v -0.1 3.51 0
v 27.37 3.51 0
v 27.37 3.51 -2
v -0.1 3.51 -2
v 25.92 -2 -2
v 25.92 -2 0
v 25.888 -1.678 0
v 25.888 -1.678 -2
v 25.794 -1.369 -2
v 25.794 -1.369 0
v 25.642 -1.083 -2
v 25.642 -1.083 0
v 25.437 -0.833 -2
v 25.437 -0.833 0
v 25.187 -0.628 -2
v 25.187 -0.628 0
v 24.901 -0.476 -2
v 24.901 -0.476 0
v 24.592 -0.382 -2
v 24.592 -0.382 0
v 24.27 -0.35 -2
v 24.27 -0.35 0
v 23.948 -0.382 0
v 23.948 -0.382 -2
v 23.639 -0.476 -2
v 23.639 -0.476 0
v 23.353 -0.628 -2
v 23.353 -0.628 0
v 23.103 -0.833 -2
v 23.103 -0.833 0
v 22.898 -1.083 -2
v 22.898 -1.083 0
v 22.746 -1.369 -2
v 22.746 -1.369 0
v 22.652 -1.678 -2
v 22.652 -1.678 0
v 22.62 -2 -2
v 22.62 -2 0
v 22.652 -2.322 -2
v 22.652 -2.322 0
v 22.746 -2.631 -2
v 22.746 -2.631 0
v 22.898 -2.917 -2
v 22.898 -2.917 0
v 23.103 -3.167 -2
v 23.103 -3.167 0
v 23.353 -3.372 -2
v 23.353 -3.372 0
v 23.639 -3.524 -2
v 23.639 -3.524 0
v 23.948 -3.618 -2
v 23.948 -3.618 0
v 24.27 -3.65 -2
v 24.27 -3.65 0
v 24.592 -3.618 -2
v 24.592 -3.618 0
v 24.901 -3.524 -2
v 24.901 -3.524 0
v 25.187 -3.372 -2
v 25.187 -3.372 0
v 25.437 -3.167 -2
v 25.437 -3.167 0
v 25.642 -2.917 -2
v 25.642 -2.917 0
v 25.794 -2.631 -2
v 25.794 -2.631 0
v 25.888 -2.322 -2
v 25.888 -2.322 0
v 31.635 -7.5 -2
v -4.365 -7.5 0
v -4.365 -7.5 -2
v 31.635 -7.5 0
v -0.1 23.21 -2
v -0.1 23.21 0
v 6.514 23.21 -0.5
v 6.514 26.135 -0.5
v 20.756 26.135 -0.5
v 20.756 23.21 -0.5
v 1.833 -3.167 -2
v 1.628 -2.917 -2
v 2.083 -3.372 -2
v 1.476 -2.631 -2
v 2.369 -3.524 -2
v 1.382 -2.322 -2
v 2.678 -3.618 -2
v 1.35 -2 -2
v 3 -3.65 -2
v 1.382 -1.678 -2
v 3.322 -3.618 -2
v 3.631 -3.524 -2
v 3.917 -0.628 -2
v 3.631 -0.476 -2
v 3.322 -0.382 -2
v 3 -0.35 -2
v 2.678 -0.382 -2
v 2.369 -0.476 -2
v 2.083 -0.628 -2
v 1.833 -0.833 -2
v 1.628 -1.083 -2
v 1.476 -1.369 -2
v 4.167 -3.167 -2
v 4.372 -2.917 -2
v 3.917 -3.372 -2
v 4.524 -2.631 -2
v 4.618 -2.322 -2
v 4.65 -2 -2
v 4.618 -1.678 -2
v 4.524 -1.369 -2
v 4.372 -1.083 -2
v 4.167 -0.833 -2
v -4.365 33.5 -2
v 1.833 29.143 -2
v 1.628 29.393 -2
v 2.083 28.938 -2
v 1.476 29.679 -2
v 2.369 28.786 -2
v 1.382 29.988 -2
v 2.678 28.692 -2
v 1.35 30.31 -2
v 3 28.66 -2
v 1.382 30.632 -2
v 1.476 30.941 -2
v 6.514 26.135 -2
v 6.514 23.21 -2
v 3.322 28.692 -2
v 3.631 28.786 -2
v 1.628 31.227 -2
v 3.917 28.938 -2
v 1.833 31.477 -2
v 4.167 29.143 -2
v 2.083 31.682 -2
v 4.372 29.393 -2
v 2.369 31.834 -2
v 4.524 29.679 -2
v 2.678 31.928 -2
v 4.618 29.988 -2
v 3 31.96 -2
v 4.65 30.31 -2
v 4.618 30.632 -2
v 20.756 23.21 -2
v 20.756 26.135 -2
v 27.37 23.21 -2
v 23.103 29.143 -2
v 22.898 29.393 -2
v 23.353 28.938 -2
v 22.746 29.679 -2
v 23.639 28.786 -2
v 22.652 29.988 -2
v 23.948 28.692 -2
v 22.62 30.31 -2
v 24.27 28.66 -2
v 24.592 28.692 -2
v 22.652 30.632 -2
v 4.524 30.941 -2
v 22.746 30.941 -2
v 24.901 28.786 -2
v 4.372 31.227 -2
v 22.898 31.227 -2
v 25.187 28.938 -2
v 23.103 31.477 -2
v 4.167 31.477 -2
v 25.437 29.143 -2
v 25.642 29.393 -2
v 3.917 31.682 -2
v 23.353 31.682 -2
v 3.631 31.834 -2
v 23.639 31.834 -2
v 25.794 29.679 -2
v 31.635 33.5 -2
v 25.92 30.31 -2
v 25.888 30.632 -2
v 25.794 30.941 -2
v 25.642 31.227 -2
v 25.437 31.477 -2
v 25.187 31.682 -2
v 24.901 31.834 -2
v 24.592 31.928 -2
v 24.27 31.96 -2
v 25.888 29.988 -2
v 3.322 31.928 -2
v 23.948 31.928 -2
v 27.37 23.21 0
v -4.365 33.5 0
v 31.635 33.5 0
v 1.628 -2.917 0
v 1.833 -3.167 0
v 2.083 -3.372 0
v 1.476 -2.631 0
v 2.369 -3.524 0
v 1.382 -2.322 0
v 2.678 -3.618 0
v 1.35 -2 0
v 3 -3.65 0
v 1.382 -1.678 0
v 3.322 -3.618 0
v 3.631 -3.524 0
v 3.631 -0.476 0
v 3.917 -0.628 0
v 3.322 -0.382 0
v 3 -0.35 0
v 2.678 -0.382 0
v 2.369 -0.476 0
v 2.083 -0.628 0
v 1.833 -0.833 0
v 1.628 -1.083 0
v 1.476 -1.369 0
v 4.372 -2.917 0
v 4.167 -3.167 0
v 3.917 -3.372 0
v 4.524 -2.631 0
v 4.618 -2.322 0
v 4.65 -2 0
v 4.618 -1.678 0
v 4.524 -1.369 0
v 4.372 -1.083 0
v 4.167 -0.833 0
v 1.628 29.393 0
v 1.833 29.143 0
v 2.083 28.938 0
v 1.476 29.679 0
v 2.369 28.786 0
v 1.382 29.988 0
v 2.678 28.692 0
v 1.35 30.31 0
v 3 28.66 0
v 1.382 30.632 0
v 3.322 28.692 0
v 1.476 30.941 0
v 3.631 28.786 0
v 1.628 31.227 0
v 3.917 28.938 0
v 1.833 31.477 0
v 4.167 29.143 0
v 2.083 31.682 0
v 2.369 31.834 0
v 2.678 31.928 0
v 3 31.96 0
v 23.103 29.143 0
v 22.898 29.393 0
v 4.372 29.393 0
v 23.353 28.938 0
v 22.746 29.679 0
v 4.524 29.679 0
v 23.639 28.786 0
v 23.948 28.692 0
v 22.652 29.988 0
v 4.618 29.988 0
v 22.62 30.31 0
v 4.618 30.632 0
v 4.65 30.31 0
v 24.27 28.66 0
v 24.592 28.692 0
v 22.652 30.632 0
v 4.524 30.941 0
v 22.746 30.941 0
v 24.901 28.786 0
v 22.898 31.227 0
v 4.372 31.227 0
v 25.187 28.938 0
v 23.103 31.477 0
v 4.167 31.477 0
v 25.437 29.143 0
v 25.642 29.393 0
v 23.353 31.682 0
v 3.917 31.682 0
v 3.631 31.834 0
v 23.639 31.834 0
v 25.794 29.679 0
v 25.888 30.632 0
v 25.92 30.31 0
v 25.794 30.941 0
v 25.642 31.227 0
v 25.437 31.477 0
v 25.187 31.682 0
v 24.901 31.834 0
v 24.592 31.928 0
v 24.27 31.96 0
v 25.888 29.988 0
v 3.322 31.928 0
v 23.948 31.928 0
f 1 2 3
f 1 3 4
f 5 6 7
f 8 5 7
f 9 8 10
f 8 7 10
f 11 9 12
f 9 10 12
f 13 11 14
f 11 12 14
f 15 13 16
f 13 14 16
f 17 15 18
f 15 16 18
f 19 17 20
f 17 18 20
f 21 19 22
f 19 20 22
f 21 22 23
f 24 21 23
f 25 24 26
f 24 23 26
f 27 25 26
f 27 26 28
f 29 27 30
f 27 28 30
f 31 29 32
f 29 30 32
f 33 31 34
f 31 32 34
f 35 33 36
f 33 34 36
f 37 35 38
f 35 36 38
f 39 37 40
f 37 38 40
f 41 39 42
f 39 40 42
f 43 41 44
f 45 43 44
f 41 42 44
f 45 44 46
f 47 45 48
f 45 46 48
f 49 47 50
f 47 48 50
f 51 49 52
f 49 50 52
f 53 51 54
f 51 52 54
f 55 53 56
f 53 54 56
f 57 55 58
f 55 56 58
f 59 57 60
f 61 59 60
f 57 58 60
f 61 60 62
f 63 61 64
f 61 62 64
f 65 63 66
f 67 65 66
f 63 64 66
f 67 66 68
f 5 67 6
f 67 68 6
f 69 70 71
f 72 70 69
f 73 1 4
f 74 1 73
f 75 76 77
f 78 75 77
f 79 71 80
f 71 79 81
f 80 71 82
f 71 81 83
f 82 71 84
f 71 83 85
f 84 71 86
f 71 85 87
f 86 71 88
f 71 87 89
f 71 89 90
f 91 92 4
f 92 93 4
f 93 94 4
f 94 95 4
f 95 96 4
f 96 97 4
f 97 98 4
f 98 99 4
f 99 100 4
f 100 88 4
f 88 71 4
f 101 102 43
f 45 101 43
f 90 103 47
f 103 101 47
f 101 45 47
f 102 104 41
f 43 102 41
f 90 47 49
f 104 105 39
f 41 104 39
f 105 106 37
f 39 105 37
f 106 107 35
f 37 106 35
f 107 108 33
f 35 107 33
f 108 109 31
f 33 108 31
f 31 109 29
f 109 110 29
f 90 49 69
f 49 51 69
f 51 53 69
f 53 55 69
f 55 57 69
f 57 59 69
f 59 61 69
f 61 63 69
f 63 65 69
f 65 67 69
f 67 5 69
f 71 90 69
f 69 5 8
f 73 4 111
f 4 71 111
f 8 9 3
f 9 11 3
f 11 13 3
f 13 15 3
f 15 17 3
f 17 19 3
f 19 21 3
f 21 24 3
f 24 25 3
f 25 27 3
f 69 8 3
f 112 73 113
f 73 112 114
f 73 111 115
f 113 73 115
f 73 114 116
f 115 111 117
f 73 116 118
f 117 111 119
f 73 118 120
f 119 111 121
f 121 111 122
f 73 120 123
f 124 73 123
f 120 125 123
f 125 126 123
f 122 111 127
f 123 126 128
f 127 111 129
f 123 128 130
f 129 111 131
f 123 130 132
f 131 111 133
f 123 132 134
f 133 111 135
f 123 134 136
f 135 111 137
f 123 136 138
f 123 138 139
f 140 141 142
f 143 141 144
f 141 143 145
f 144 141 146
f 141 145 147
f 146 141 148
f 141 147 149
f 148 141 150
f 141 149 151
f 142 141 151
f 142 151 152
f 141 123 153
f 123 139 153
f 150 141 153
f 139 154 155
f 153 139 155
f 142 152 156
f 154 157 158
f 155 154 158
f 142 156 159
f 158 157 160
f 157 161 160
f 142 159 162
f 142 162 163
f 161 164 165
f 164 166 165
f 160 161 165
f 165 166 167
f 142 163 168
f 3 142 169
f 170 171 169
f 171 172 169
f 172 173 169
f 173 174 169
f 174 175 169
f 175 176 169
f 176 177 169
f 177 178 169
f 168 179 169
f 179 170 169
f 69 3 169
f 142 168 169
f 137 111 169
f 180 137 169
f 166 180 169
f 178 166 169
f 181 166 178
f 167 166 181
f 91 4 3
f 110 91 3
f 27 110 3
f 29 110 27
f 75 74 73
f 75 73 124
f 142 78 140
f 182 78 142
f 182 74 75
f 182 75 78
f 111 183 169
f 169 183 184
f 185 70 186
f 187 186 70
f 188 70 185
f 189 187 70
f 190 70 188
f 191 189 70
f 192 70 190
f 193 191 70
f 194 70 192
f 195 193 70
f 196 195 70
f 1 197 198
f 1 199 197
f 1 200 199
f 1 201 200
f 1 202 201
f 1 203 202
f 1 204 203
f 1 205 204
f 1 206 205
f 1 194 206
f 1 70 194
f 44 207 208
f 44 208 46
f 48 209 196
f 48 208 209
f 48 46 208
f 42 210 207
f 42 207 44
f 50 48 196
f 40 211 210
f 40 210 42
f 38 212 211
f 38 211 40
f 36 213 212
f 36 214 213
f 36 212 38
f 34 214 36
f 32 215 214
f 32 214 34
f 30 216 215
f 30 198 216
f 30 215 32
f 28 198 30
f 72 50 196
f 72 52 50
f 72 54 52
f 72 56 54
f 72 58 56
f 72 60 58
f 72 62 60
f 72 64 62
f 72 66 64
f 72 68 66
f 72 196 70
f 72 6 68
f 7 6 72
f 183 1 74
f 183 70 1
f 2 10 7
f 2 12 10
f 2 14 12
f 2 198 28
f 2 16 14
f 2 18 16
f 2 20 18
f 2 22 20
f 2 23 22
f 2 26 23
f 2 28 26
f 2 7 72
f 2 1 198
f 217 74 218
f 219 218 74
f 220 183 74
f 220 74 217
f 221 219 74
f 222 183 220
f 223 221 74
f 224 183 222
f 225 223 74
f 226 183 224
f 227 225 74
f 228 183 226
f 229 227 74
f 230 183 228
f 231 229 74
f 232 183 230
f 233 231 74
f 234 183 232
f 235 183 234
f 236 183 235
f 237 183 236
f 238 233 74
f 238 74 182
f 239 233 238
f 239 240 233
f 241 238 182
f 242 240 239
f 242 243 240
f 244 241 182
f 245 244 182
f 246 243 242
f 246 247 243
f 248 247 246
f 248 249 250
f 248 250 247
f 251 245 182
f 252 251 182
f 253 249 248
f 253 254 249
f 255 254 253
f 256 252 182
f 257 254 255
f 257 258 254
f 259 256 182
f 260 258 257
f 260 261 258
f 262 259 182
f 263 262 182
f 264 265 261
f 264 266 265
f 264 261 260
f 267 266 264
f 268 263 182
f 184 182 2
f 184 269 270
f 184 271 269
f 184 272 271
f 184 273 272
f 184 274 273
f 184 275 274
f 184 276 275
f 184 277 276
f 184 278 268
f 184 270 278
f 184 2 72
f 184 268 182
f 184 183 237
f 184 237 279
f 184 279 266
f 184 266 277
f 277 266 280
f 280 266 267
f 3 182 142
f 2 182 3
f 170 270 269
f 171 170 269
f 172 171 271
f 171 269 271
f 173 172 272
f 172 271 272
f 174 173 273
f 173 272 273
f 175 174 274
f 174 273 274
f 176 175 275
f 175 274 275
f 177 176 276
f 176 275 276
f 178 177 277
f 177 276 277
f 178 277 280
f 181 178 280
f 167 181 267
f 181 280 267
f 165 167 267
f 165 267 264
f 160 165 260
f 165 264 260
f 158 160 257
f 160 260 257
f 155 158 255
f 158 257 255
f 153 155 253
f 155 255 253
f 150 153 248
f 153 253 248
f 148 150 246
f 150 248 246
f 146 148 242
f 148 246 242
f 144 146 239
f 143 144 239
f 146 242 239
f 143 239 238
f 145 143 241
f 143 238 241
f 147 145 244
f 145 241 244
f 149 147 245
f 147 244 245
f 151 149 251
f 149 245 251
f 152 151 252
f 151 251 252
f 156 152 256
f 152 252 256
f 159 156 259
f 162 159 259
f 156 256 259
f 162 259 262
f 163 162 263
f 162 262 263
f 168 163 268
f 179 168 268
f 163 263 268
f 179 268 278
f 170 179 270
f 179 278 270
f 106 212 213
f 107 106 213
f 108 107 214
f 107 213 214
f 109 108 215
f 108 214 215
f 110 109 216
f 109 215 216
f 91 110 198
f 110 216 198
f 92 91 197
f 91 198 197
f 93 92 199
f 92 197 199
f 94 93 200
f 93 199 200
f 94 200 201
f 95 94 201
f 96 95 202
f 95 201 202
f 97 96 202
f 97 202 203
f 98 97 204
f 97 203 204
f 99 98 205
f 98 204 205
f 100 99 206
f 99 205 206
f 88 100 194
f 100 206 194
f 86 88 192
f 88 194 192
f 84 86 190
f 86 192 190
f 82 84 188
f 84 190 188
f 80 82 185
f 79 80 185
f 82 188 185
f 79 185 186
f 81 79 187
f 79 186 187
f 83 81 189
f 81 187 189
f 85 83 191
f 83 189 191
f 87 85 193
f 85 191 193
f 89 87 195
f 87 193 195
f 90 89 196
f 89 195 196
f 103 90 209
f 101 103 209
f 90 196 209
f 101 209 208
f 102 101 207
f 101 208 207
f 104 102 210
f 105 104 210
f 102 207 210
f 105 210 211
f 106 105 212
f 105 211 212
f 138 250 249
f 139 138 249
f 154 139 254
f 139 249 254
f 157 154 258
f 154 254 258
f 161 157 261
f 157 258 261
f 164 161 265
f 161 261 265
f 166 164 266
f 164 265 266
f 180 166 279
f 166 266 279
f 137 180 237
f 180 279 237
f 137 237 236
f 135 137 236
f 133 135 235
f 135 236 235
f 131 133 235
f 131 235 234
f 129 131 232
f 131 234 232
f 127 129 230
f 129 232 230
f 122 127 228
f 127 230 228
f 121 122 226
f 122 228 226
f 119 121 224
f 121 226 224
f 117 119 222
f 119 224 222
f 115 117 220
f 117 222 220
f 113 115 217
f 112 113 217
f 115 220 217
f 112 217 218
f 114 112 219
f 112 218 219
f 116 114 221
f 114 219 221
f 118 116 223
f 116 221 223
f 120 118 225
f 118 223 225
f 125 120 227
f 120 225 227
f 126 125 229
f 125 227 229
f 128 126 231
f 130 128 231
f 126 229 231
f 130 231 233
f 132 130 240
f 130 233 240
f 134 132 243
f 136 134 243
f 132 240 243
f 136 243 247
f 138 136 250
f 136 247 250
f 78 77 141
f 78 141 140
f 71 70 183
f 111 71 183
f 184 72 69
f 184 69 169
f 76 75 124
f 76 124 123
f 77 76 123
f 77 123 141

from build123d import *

# Parameters (mm, degrees)
SKETCH033_W      = 36
SKETCH033_H      = 41
SKETCH033_R      = 1.65
EXTRUDE035_DEPTH = 2
SKETCH039_W      = 14.242
SKETCH039_H      = 2.925
EXTRUDE039_DEPTH = 0.5


with BuildPart() as extrude_displaycase_front:
    # Sketch033 → Extrude035 (new body)
    with BuildSketch(Plane.XY):
        with Locations((13.635, 13)):
            Rectangle(SKETCH033_W, SKETCH033_H)
        with Locations((3, 30.31)):
            Circle(SKETCH033_R, mode=Mode.SUBTRACT)
        with Locations((24.27, 30.31)):
            Circle(SKETCH033_R, mode=Mode.SUBTRACT)
        with Locations((3, -2)):
            Circle(SKETCH033_R, mode=Mode.SUBTRACT)
        with Locations((24.27, -2)):
            Circle(SKETCH033_R, mode=Mode.SUBTRACT)
        Polygon((27.37, 23.21), (27.37, 3.51), (-0.1, 3.51), (-0.1, 23.21), (6.514, 23.21), (6.514, 26.135), (20.756, 26.135), (20.756, 23.21), align=None, mode=Mode.SUBTRACT)
    extrude(amount=-EXTRUDE035_DEPTH)


with BuildPart() as fusion_displaycase_front:
    # Sketch039 → Extrude039 (new body)
    with BuildSketch(Plane.XY):
        with Locations((13.635, 24.6725)):
            Rectangle(SKETCH039_W, SKETCH039_H)
    extrude(amount=-EXTRUDE039_DEPTH)

    # Fusion012: union Extrude_DisplayCase_Front
    add(extrude_displaycase_front.part)


solid = fusion_displaycase_front.part
